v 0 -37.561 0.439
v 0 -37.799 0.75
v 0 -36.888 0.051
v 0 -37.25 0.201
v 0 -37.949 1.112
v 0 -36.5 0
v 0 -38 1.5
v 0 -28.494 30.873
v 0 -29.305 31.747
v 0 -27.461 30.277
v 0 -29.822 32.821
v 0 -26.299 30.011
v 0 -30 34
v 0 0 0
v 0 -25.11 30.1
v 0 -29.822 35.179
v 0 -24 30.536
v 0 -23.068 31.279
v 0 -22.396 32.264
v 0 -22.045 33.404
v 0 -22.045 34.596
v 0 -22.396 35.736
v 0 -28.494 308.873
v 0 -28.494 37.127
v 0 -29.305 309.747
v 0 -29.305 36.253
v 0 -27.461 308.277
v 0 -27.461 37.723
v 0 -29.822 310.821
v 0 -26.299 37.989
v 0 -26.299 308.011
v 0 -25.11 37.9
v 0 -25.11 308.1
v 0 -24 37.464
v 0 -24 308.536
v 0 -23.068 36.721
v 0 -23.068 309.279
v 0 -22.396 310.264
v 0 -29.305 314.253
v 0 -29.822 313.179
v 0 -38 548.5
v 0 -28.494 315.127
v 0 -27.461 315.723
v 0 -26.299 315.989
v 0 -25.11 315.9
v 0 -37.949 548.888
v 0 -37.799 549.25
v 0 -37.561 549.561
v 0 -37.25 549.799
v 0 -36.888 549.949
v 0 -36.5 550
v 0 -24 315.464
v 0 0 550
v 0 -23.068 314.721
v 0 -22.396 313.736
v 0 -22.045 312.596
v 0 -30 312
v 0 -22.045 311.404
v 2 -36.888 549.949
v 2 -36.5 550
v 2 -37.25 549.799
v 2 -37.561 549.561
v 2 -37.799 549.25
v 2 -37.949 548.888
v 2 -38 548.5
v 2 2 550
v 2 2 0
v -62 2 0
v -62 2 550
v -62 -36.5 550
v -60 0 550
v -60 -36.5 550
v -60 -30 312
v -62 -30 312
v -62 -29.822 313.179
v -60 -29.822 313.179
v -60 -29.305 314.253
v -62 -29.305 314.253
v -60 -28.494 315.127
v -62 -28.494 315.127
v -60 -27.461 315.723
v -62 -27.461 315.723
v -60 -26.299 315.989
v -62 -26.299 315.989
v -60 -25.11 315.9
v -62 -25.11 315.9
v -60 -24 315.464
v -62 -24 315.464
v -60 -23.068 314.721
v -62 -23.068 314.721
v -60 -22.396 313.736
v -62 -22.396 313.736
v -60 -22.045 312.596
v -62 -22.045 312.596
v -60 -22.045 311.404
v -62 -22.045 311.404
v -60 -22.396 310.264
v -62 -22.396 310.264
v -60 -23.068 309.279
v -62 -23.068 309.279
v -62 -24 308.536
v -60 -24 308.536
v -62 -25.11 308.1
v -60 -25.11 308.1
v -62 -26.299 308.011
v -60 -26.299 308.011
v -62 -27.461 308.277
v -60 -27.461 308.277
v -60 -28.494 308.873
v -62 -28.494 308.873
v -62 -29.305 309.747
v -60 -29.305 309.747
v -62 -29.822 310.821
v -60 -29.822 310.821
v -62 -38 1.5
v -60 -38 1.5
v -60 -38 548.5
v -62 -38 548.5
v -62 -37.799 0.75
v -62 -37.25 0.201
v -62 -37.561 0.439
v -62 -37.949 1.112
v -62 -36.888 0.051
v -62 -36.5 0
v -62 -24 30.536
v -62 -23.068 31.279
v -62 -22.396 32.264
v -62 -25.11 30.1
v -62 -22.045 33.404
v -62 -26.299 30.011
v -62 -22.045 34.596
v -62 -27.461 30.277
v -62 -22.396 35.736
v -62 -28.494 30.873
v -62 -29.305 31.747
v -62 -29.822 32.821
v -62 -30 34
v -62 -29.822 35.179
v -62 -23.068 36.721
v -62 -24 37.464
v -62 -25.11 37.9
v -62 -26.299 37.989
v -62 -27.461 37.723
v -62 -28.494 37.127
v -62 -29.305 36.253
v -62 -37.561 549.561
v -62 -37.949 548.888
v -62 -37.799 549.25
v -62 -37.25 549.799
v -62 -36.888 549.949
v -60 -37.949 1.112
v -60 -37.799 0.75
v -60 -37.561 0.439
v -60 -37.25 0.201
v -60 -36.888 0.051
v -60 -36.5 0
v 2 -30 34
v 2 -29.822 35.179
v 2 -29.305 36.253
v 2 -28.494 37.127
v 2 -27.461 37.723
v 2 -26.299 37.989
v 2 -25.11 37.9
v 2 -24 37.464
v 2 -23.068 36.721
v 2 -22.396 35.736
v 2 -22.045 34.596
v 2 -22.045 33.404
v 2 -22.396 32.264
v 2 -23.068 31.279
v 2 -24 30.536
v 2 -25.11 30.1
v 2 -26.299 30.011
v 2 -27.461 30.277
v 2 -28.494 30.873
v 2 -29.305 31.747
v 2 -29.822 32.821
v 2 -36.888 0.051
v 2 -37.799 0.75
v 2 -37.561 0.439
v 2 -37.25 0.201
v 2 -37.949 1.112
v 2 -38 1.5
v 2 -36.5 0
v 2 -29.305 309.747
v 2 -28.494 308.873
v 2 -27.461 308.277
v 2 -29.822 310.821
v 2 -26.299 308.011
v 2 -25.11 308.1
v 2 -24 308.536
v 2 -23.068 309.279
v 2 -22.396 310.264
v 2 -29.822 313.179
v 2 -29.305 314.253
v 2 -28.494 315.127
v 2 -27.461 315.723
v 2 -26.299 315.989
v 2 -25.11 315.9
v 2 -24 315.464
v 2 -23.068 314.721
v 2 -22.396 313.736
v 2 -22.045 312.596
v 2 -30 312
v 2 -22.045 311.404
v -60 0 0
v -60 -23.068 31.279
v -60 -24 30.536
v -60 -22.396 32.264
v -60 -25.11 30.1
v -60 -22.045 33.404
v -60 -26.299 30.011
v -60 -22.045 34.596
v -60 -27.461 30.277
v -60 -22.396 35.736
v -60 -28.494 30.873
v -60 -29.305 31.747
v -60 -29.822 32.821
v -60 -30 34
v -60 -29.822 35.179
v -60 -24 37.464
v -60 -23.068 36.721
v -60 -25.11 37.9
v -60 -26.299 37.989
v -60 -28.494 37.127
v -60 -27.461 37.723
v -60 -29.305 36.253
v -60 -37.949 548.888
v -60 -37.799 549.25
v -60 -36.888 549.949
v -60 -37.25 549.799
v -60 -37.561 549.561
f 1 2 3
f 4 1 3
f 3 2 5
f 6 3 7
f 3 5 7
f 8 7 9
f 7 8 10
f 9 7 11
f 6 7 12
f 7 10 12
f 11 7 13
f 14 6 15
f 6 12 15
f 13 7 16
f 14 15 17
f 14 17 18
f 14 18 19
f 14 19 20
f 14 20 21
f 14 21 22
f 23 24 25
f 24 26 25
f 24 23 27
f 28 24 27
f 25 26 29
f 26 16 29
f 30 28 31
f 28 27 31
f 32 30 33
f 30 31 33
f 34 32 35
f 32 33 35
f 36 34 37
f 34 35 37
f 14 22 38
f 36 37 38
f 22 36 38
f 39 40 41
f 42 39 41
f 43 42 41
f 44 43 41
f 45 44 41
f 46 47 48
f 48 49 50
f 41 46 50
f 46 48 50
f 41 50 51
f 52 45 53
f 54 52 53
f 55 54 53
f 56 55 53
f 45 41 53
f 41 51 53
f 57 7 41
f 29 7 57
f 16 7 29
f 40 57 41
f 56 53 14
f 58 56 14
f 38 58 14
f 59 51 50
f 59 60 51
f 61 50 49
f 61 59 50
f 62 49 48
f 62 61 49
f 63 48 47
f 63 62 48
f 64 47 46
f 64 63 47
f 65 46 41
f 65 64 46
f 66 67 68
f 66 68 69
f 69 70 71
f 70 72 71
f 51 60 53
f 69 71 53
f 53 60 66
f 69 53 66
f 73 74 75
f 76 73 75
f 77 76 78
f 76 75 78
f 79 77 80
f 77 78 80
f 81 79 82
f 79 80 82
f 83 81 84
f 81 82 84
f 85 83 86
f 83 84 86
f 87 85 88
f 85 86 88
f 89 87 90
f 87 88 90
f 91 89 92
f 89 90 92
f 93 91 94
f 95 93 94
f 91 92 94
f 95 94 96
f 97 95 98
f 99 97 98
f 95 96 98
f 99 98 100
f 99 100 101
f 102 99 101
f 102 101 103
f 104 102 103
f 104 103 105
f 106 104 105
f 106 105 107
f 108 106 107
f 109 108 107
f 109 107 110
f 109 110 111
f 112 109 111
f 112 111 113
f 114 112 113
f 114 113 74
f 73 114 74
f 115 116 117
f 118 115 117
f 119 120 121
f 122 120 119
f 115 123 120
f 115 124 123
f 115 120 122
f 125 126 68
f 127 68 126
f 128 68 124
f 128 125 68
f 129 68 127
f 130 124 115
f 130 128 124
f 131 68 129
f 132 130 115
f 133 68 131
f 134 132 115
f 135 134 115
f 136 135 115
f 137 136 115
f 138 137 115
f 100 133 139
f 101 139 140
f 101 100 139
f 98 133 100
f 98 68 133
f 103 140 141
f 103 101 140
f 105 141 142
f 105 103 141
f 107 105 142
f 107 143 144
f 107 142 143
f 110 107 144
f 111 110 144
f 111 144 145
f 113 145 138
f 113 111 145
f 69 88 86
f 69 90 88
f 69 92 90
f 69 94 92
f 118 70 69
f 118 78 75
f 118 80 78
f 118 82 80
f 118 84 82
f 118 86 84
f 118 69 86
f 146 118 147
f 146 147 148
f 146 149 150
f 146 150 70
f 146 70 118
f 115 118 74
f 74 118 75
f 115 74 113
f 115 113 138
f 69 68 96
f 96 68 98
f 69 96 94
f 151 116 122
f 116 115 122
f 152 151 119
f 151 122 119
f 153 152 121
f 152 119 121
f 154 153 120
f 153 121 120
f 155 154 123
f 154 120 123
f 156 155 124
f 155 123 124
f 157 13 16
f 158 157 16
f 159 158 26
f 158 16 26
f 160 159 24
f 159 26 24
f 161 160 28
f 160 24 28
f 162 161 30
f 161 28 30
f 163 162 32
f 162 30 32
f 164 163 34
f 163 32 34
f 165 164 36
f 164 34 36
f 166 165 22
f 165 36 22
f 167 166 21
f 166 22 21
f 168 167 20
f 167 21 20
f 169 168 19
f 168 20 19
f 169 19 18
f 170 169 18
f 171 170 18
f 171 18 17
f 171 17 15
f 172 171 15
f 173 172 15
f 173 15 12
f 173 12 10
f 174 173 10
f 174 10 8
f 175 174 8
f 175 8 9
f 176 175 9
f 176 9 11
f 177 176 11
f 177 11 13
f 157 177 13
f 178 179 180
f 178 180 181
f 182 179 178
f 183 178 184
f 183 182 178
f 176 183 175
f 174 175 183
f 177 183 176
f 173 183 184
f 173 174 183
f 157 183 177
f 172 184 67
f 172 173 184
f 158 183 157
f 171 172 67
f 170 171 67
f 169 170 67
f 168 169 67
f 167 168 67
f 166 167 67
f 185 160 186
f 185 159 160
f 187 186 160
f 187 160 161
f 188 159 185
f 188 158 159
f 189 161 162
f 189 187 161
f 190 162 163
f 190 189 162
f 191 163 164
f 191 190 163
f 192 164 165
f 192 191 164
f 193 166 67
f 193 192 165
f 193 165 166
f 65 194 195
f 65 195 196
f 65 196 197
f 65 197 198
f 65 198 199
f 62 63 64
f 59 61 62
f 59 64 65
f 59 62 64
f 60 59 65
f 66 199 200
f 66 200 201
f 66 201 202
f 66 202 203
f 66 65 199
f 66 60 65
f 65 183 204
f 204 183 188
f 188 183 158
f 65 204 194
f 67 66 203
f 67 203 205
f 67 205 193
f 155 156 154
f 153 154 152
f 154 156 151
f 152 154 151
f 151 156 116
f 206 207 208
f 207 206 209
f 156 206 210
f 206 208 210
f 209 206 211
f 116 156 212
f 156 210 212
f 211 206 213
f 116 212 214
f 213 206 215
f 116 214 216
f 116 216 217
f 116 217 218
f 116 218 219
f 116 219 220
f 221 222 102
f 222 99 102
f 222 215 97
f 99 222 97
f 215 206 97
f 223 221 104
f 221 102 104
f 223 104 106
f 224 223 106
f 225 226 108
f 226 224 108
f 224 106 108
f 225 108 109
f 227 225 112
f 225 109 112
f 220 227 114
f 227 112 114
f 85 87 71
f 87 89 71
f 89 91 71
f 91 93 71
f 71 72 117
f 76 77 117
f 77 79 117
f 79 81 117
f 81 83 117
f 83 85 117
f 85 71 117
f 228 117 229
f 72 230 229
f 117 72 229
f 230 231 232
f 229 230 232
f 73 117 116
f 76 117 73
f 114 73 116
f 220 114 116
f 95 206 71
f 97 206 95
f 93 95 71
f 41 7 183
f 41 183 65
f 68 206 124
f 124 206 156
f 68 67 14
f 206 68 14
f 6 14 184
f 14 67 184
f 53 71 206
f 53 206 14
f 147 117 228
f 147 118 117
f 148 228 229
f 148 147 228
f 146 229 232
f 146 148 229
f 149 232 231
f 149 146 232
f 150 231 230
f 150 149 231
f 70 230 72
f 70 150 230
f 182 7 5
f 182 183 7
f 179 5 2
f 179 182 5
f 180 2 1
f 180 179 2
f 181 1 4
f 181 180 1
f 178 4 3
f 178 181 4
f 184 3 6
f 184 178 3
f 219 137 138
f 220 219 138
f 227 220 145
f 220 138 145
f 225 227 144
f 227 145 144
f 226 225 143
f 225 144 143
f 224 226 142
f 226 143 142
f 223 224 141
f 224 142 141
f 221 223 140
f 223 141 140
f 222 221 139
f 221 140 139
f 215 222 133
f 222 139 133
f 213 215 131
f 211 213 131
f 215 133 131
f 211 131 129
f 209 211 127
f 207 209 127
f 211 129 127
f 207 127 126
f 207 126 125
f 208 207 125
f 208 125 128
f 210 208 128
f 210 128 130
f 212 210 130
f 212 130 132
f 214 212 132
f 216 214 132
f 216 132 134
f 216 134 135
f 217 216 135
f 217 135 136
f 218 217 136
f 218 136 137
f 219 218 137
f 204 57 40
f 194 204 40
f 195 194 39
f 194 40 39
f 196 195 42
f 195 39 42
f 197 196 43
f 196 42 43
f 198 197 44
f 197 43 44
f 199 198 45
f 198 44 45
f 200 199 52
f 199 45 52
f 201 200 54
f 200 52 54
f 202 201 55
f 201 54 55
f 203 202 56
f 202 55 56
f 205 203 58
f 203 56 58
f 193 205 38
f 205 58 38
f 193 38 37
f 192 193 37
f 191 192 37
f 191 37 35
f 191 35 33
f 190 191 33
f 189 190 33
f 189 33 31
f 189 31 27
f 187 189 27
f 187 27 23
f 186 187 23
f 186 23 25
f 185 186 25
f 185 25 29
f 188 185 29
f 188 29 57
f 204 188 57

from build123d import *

# Parameters (mm, degrees)
F0_W     = 60
F0_H     = 550
F1_DEPTH = 2
F2_W     = 38
F2_H     = 550
F2_W_2   = 2
F3_DEPTH = 2
F4_W     = 38
F4_H     = 550
F4_W_2   = 2
F5_DEPTH = 2
F6_R     = 1.5
F7_R     = 1.5
F8_R     = 4
F9_DEPTH = 64.001


with BuildPart() as f1:
    # F0 (on Front) → F1 (new body)
    with BuildSketch(Plane.XZ):
        with Locations((-30, 275)):
            Rectangle(F0_W, F0_H)
    extrude(amount=-F1_DEPTH)

    # F2 (on face) → F3 (join)
    with BuildSketch(Plane.YZ):
        with Locations((-19, 275)):
            Rectangle(F2_W, F2_H)
        with Locations((1, 275)):
            Rectangle(F2_W_2, F2_H)
    extrude(amount=F3_DEPTH)

    # F4 (on face) → F5 (join)
    with BuildSketch(Plane(origin=(-60, 0, 0), x_dir=(0, -1, 0), z_dir=(-1, 0, 0))):
        with Locations((19, 275)):
            Rectangle(F4_W, F4_H)
        with Locations((-1, 275)):
            Rectangle(F4_W_2, F4_H)
    extrude(amount=F5_DEPTH)

    # F6
    f6_edges = [f1.edges().sort_by_distance(p)[0] for p in [
        (-61, -38, 0),
        (1, -38, 0),
    ]]
    fillet(f6_edges, radius=F6_R)

    # F7
    f7_edges = [f1.edges().sort_by_distance(p)[0] for p in [
        (-61, -38, 550),
        (1, -38, 550),
    ]]
    fillet(f7_edges, radius=F7_R)

    # F8 (on face) → F9 (cut, through all)
    with BuildSketch(Plane(origin=(-62, 0, 0), x_dir=(0, -1, 0), z_dir=(-1, 0, 0))):
        with Locations((26, 312)):
            Circle(F8_R)
        with Locations((26, 34)):
            Circle(F8_R)
    extrude(amount=-F9_DEPTH, mode=Mode.SUBTRACT)


solid = f1.part
